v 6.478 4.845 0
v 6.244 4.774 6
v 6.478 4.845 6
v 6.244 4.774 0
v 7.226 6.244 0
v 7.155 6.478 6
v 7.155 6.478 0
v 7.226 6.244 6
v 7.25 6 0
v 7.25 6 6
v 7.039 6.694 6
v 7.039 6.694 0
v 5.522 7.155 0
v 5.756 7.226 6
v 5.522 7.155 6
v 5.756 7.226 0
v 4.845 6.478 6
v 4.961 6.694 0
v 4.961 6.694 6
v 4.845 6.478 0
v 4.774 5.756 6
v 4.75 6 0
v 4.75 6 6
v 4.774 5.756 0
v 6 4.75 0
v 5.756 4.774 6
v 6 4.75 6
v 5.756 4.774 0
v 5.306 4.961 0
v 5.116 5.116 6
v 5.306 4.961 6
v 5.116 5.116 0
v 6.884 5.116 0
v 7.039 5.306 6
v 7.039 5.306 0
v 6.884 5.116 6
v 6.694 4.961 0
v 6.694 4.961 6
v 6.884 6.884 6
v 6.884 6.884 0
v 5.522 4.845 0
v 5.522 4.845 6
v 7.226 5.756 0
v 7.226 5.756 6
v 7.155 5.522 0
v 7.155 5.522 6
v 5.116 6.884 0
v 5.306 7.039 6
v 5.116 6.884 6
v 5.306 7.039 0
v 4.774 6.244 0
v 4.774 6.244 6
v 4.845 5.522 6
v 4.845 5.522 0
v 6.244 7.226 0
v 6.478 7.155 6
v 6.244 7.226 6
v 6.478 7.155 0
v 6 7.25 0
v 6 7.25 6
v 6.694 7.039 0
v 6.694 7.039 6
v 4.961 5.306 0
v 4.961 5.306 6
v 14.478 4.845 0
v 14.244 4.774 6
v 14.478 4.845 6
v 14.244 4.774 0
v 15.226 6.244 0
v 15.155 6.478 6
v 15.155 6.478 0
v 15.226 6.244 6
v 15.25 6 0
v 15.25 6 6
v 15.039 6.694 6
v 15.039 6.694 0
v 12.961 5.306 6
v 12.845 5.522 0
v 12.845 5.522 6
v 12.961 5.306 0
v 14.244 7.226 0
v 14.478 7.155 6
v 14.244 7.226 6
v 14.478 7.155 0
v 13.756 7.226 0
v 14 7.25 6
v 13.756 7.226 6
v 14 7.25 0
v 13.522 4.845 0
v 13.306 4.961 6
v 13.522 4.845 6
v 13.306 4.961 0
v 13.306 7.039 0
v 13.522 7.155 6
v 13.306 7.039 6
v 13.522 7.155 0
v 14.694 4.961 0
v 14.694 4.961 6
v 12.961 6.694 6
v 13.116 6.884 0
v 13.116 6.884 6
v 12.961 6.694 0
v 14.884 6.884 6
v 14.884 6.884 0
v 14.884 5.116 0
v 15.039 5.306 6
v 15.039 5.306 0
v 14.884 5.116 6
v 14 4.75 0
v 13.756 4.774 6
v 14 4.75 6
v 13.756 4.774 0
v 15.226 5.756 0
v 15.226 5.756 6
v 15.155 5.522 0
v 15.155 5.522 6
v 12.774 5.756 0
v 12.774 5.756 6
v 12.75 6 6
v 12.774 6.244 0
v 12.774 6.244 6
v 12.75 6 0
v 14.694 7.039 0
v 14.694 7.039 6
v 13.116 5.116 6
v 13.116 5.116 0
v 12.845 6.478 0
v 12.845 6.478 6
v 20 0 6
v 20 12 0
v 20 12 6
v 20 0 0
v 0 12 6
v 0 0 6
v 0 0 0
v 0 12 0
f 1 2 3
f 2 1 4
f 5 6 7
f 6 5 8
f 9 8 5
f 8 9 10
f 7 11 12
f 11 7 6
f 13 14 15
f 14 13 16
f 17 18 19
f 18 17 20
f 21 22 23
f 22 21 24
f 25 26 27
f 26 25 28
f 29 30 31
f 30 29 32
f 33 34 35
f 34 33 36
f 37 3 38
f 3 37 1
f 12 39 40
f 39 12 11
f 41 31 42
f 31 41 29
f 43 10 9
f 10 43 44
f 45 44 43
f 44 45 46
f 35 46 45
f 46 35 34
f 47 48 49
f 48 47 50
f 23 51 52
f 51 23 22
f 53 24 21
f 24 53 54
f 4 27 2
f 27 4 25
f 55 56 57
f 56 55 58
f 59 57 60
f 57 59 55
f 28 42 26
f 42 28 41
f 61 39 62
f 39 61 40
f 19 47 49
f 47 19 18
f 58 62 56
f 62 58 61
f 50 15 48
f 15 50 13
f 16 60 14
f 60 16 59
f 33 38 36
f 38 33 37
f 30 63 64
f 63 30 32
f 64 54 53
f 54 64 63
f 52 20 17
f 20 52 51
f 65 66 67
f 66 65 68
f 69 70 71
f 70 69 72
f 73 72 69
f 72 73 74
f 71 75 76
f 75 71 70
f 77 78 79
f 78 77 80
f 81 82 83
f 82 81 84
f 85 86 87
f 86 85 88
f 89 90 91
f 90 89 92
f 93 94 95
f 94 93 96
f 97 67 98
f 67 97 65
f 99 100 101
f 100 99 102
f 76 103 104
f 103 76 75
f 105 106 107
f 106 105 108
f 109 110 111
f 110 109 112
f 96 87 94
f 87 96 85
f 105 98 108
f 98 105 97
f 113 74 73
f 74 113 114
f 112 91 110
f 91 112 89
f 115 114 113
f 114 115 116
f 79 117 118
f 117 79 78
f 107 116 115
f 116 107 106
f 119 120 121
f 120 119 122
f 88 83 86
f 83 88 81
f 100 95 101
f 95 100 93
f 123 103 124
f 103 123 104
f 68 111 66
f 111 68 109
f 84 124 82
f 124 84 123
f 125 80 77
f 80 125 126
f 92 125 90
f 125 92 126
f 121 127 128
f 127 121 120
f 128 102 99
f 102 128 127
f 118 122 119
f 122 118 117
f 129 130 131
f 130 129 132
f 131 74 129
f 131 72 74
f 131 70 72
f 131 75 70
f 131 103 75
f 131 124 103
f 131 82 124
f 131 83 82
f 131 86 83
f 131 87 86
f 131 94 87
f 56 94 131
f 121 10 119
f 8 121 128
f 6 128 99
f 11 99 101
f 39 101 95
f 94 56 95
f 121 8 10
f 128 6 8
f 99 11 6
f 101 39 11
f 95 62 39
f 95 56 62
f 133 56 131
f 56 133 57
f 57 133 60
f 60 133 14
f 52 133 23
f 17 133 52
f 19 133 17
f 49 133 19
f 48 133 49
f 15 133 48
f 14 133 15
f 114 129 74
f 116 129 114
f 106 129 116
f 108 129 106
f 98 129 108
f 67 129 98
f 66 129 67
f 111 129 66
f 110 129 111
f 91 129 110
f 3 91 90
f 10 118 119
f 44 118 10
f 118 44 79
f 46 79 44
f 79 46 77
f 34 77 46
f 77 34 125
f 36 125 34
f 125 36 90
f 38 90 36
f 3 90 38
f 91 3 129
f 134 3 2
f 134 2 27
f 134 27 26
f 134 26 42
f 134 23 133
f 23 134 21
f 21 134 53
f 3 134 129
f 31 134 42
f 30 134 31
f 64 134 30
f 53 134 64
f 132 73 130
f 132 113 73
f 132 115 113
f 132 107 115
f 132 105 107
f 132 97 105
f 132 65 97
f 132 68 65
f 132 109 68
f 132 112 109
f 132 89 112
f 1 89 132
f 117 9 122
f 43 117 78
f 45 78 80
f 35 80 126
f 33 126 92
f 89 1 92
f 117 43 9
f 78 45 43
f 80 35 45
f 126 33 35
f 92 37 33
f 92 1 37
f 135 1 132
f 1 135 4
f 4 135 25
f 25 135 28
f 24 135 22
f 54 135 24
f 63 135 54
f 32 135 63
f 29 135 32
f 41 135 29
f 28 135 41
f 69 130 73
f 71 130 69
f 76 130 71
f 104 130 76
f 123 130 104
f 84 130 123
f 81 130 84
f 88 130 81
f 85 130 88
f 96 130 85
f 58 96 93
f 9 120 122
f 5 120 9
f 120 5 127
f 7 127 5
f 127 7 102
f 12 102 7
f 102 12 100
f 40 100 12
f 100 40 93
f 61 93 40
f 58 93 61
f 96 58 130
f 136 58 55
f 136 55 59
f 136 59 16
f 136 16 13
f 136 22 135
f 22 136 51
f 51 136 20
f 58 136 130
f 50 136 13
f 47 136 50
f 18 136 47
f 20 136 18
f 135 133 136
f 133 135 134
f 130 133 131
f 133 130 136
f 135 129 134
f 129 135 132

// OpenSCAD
$fn = 32;

// ----------------------------------------------------------------------
// Micro pad: two-hole pad, 5-20 mm class
// ----------------------------------------------------------------------

// --- parameters (mm) ---
pad_l = 20;               // pad length, X
pad_w = 12;               // pad width, Y
pad_t = 6;                // pad thickness, Z
hole_d = 2.5;             // hole diameter
hole_x = 6;               // X of the first hole centre

difference() {
  cube([pad_l, pad_w, pad_t]);
  for (x = [hole_x, pad_l - hole_x])
    translate([x, pad_w / 2, -1])
      cylinder(h = pad_t + 2, d = hole_d);
}
